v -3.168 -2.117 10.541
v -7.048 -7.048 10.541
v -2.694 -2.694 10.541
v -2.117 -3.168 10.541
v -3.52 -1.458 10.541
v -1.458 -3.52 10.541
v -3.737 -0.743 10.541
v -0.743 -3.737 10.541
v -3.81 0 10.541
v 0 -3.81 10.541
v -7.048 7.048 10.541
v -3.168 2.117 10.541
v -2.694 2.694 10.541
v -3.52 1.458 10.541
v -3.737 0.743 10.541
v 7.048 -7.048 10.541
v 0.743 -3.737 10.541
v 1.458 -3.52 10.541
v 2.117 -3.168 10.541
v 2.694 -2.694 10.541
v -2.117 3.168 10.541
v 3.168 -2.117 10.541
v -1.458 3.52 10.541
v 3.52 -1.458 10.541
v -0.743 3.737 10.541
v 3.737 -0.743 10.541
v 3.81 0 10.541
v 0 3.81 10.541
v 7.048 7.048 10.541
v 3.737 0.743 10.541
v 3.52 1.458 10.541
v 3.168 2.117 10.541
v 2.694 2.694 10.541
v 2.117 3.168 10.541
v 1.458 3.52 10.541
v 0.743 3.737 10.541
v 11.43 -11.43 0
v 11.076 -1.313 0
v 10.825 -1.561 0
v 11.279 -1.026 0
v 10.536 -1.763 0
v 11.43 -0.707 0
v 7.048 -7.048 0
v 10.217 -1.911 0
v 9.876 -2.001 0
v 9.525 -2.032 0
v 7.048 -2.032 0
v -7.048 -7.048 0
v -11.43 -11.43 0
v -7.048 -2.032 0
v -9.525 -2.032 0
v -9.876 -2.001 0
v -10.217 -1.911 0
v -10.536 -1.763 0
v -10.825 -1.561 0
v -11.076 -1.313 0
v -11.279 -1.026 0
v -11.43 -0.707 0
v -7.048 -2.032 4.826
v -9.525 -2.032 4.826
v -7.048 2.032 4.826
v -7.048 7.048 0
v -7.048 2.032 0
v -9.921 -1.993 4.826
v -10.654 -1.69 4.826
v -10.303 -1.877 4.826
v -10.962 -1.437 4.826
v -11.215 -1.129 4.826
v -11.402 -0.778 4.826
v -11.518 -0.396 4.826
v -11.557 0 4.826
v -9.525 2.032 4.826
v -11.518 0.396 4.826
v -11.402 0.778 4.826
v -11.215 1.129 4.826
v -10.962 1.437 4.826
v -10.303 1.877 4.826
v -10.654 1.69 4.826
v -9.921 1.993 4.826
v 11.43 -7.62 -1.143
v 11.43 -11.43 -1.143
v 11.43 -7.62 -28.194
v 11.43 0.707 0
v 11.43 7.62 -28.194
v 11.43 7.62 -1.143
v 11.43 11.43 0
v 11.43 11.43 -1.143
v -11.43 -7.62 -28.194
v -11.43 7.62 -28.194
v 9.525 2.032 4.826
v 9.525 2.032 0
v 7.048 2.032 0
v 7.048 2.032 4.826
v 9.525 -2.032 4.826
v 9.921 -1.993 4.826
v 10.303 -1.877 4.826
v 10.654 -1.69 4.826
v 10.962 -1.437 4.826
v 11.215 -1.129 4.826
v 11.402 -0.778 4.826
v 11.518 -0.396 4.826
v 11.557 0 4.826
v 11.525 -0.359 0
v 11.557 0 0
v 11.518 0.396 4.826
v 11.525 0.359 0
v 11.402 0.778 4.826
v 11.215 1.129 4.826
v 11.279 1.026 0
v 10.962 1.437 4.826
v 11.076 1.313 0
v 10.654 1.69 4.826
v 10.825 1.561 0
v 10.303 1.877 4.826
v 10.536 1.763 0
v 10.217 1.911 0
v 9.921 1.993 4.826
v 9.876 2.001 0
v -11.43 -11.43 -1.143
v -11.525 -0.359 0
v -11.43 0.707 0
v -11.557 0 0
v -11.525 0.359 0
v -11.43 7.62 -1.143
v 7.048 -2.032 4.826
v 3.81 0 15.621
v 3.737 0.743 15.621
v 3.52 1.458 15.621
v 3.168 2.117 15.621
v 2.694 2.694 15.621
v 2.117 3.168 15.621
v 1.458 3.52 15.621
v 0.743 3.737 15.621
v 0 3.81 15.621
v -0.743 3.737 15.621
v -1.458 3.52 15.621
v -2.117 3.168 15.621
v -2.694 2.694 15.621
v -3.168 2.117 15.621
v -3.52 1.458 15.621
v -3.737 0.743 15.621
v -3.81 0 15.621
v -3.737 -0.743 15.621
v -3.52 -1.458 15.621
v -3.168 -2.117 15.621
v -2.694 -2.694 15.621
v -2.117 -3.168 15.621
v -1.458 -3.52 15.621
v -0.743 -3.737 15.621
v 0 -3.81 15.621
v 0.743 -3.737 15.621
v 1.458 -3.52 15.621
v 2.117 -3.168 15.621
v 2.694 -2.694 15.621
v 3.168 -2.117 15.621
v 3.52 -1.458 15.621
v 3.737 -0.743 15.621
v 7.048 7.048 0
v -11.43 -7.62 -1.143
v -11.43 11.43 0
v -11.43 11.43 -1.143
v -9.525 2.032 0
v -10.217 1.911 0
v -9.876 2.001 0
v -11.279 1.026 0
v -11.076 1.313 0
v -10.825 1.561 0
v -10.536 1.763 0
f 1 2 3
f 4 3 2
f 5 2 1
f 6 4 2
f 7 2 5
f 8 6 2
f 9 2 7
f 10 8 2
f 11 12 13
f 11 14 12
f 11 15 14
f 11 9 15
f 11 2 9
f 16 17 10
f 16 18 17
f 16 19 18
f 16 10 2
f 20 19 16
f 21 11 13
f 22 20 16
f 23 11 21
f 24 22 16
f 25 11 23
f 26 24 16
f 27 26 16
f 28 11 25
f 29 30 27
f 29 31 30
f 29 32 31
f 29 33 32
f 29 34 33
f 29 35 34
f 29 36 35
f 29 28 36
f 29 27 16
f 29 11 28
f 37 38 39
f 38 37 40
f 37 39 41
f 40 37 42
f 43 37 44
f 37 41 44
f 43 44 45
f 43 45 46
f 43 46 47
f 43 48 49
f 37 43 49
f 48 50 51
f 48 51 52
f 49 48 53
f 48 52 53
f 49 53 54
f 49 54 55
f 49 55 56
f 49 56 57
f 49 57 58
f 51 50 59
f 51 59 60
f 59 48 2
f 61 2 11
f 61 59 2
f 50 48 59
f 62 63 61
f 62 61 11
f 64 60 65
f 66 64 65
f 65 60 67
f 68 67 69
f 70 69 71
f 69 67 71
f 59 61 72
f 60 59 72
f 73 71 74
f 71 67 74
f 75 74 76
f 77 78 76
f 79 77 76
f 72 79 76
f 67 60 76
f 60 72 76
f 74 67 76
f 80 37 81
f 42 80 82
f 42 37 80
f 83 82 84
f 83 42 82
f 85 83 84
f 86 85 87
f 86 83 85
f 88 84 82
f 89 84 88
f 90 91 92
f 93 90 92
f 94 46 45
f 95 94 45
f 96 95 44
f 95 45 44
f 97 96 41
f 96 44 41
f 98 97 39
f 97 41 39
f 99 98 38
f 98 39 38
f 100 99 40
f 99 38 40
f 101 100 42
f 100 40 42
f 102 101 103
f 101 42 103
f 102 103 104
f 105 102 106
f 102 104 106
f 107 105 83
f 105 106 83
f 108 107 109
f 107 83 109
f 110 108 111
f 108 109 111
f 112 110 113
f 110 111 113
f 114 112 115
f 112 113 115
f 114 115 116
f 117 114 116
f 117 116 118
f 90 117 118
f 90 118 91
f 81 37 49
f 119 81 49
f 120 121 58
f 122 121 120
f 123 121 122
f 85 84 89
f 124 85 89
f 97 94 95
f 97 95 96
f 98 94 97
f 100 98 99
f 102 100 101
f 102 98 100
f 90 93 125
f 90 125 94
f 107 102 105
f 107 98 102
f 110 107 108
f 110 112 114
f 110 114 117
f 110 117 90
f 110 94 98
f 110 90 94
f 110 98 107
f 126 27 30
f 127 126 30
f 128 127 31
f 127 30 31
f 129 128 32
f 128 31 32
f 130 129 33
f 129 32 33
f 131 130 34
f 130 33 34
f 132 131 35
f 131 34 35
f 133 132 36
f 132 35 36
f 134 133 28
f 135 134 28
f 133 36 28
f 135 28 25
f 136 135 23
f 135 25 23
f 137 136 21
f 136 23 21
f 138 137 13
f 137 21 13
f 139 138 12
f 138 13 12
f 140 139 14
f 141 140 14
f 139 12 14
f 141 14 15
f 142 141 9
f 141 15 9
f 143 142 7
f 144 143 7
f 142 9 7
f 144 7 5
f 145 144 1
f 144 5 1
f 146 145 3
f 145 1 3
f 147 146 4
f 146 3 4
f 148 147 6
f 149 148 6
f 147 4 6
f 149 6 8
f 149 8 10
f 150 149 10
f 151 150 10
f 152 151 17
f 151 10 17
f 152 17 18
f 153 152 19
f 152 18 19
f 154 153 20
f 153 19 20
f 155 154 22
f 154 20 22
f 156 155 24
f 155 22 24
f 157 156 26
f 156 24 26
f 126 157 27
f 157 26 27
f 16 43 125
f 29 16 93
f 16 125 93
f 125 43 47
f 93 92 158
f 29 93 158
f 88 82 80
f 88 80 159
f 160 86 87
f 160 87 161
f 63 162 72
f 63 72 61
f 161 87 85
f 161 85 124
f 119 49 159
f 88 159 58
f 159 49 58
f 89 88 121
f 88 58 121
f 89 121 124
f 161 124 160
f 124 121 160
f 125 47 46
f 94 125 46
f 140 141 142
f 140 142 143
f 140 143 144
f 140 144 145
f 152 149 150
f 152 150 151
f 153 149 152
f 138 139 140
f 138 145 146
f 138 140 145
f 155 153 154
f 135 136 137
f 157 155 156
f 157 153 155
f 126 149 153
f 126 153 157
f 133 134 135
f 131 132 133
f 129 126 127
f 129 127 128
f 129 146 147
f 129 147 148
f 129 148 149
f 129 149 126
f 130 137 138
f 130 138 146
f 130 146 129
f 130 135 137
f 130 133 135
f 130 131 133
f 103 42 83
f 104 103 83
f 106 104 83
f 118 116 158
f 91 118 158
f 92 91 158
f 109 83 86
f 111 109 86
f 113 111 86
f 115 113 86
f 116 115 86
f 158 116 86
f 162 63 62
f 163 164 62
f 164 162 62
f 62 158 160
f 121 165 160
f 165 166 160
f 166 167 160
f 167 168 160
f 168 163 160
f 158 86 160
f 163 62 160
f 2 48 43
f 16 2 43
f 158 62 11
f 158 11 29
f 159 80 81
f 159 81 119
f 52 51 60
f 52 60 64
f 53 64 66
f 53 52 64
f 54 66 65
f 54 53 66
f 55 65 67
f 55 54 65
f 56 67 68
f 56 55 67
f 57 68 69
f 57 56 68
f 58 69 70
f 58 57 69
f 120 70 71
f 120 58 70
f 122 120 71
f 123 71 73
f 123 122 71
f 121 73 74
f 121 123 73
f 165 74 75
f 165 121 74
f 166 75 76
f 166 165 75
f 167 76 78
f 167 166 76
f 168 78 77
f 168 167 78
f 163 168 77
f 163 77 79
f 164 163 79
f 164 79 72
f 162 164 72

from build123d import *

# Parameters (mm, degrees)
SKETCH1_W           = 14.097
SKETCH1_H           = 14.097
BOSS_EXTRUDE1_DEPTH = 10.541
SKETCH2_R           = 3.81
BOSS_EXTRUDE2_DEPTH = 5.08
BOSS_EXTRUDE3_DEPTH = 4.826
SKETCH4_W           = 22.86
SKETCH4_H           = 22.86
BOSS_EXTRUDE4_DEPTH = 1.143
SKETCH5_W           = 22.86
SKETCH5_H           = 15.24
BOSS_EXTRUDE5_DEPTH = 27.051


with BuildPart() as part:
    # Sketch1 → Boss-Extrude1 (new body)
    with BuildSketch(Plane.XY):
        Rectangle(SKETCH1_W, SKETCH1_H)
    extrude(amount=BOSS_EXTRUDE1_DEPTH)

    # Sketch2 → Boss-Extrude2 (add)
    with BuildSketch(Plane.XY.offset(10.541)):
        Circle(SKETCH2_R)
    extrude(amount=BOSS_EXTRUDE2_DEPTH)

    # Sketch3 → Boss-Extrude3 (add)
    with BuildSketch(Plane(origin=(0, 0, 0), x_dir=(-1, 0, 0), z_dir=(0, 0, -1))):
        with BuildLine():
            Line((-9.525, 2.032), (-7.0485, 2.032))
            Line((-7.0485, 2.032), (-7.0485, -2.032))
            Line((-7.0485, -2.032), (-9.525, -2.032))
            ThreePointArc((-9.525, -2.032), (-11.557, 0), (-9.525, 2.032))
        make_face()
    boss_extrude3 = extrude(amount=-BOSS_EXTRUDE3_DEPTH)

    # Mirror1: Boss-Extrude3 across plane
    add(boss_extrude3.mirror(Plane(origin=(0, 0, 0), x_dir=(0, 0, 1), z_dir=(1, 0, 0))))

    # Sketch4 → Boss-Extrude4 (add)
    with BuildSketch(Plane(origin=(0, 0, 0), x_dir=(-1, 0, 0), z_dir=(0, 0, -1))):
        Rectangle(SKETCH4_W, SKETCH4_H)
    extrude(amount=BOSS_EXTRUDE4_DEPTH)

    # Sketch5 → Boss-Extrude5 (add)
    with BuildSketch(Plane(origin=(0, 0, -1.143), x_dir=(-1, 0, 0), z_dir=(0, 0, -1))):
        Rectangle(SKETCH5_W, SKETCH5_H)
    extrude(amount=BOSS_EXTRUDE5_DEPTH)


solid = part.part
